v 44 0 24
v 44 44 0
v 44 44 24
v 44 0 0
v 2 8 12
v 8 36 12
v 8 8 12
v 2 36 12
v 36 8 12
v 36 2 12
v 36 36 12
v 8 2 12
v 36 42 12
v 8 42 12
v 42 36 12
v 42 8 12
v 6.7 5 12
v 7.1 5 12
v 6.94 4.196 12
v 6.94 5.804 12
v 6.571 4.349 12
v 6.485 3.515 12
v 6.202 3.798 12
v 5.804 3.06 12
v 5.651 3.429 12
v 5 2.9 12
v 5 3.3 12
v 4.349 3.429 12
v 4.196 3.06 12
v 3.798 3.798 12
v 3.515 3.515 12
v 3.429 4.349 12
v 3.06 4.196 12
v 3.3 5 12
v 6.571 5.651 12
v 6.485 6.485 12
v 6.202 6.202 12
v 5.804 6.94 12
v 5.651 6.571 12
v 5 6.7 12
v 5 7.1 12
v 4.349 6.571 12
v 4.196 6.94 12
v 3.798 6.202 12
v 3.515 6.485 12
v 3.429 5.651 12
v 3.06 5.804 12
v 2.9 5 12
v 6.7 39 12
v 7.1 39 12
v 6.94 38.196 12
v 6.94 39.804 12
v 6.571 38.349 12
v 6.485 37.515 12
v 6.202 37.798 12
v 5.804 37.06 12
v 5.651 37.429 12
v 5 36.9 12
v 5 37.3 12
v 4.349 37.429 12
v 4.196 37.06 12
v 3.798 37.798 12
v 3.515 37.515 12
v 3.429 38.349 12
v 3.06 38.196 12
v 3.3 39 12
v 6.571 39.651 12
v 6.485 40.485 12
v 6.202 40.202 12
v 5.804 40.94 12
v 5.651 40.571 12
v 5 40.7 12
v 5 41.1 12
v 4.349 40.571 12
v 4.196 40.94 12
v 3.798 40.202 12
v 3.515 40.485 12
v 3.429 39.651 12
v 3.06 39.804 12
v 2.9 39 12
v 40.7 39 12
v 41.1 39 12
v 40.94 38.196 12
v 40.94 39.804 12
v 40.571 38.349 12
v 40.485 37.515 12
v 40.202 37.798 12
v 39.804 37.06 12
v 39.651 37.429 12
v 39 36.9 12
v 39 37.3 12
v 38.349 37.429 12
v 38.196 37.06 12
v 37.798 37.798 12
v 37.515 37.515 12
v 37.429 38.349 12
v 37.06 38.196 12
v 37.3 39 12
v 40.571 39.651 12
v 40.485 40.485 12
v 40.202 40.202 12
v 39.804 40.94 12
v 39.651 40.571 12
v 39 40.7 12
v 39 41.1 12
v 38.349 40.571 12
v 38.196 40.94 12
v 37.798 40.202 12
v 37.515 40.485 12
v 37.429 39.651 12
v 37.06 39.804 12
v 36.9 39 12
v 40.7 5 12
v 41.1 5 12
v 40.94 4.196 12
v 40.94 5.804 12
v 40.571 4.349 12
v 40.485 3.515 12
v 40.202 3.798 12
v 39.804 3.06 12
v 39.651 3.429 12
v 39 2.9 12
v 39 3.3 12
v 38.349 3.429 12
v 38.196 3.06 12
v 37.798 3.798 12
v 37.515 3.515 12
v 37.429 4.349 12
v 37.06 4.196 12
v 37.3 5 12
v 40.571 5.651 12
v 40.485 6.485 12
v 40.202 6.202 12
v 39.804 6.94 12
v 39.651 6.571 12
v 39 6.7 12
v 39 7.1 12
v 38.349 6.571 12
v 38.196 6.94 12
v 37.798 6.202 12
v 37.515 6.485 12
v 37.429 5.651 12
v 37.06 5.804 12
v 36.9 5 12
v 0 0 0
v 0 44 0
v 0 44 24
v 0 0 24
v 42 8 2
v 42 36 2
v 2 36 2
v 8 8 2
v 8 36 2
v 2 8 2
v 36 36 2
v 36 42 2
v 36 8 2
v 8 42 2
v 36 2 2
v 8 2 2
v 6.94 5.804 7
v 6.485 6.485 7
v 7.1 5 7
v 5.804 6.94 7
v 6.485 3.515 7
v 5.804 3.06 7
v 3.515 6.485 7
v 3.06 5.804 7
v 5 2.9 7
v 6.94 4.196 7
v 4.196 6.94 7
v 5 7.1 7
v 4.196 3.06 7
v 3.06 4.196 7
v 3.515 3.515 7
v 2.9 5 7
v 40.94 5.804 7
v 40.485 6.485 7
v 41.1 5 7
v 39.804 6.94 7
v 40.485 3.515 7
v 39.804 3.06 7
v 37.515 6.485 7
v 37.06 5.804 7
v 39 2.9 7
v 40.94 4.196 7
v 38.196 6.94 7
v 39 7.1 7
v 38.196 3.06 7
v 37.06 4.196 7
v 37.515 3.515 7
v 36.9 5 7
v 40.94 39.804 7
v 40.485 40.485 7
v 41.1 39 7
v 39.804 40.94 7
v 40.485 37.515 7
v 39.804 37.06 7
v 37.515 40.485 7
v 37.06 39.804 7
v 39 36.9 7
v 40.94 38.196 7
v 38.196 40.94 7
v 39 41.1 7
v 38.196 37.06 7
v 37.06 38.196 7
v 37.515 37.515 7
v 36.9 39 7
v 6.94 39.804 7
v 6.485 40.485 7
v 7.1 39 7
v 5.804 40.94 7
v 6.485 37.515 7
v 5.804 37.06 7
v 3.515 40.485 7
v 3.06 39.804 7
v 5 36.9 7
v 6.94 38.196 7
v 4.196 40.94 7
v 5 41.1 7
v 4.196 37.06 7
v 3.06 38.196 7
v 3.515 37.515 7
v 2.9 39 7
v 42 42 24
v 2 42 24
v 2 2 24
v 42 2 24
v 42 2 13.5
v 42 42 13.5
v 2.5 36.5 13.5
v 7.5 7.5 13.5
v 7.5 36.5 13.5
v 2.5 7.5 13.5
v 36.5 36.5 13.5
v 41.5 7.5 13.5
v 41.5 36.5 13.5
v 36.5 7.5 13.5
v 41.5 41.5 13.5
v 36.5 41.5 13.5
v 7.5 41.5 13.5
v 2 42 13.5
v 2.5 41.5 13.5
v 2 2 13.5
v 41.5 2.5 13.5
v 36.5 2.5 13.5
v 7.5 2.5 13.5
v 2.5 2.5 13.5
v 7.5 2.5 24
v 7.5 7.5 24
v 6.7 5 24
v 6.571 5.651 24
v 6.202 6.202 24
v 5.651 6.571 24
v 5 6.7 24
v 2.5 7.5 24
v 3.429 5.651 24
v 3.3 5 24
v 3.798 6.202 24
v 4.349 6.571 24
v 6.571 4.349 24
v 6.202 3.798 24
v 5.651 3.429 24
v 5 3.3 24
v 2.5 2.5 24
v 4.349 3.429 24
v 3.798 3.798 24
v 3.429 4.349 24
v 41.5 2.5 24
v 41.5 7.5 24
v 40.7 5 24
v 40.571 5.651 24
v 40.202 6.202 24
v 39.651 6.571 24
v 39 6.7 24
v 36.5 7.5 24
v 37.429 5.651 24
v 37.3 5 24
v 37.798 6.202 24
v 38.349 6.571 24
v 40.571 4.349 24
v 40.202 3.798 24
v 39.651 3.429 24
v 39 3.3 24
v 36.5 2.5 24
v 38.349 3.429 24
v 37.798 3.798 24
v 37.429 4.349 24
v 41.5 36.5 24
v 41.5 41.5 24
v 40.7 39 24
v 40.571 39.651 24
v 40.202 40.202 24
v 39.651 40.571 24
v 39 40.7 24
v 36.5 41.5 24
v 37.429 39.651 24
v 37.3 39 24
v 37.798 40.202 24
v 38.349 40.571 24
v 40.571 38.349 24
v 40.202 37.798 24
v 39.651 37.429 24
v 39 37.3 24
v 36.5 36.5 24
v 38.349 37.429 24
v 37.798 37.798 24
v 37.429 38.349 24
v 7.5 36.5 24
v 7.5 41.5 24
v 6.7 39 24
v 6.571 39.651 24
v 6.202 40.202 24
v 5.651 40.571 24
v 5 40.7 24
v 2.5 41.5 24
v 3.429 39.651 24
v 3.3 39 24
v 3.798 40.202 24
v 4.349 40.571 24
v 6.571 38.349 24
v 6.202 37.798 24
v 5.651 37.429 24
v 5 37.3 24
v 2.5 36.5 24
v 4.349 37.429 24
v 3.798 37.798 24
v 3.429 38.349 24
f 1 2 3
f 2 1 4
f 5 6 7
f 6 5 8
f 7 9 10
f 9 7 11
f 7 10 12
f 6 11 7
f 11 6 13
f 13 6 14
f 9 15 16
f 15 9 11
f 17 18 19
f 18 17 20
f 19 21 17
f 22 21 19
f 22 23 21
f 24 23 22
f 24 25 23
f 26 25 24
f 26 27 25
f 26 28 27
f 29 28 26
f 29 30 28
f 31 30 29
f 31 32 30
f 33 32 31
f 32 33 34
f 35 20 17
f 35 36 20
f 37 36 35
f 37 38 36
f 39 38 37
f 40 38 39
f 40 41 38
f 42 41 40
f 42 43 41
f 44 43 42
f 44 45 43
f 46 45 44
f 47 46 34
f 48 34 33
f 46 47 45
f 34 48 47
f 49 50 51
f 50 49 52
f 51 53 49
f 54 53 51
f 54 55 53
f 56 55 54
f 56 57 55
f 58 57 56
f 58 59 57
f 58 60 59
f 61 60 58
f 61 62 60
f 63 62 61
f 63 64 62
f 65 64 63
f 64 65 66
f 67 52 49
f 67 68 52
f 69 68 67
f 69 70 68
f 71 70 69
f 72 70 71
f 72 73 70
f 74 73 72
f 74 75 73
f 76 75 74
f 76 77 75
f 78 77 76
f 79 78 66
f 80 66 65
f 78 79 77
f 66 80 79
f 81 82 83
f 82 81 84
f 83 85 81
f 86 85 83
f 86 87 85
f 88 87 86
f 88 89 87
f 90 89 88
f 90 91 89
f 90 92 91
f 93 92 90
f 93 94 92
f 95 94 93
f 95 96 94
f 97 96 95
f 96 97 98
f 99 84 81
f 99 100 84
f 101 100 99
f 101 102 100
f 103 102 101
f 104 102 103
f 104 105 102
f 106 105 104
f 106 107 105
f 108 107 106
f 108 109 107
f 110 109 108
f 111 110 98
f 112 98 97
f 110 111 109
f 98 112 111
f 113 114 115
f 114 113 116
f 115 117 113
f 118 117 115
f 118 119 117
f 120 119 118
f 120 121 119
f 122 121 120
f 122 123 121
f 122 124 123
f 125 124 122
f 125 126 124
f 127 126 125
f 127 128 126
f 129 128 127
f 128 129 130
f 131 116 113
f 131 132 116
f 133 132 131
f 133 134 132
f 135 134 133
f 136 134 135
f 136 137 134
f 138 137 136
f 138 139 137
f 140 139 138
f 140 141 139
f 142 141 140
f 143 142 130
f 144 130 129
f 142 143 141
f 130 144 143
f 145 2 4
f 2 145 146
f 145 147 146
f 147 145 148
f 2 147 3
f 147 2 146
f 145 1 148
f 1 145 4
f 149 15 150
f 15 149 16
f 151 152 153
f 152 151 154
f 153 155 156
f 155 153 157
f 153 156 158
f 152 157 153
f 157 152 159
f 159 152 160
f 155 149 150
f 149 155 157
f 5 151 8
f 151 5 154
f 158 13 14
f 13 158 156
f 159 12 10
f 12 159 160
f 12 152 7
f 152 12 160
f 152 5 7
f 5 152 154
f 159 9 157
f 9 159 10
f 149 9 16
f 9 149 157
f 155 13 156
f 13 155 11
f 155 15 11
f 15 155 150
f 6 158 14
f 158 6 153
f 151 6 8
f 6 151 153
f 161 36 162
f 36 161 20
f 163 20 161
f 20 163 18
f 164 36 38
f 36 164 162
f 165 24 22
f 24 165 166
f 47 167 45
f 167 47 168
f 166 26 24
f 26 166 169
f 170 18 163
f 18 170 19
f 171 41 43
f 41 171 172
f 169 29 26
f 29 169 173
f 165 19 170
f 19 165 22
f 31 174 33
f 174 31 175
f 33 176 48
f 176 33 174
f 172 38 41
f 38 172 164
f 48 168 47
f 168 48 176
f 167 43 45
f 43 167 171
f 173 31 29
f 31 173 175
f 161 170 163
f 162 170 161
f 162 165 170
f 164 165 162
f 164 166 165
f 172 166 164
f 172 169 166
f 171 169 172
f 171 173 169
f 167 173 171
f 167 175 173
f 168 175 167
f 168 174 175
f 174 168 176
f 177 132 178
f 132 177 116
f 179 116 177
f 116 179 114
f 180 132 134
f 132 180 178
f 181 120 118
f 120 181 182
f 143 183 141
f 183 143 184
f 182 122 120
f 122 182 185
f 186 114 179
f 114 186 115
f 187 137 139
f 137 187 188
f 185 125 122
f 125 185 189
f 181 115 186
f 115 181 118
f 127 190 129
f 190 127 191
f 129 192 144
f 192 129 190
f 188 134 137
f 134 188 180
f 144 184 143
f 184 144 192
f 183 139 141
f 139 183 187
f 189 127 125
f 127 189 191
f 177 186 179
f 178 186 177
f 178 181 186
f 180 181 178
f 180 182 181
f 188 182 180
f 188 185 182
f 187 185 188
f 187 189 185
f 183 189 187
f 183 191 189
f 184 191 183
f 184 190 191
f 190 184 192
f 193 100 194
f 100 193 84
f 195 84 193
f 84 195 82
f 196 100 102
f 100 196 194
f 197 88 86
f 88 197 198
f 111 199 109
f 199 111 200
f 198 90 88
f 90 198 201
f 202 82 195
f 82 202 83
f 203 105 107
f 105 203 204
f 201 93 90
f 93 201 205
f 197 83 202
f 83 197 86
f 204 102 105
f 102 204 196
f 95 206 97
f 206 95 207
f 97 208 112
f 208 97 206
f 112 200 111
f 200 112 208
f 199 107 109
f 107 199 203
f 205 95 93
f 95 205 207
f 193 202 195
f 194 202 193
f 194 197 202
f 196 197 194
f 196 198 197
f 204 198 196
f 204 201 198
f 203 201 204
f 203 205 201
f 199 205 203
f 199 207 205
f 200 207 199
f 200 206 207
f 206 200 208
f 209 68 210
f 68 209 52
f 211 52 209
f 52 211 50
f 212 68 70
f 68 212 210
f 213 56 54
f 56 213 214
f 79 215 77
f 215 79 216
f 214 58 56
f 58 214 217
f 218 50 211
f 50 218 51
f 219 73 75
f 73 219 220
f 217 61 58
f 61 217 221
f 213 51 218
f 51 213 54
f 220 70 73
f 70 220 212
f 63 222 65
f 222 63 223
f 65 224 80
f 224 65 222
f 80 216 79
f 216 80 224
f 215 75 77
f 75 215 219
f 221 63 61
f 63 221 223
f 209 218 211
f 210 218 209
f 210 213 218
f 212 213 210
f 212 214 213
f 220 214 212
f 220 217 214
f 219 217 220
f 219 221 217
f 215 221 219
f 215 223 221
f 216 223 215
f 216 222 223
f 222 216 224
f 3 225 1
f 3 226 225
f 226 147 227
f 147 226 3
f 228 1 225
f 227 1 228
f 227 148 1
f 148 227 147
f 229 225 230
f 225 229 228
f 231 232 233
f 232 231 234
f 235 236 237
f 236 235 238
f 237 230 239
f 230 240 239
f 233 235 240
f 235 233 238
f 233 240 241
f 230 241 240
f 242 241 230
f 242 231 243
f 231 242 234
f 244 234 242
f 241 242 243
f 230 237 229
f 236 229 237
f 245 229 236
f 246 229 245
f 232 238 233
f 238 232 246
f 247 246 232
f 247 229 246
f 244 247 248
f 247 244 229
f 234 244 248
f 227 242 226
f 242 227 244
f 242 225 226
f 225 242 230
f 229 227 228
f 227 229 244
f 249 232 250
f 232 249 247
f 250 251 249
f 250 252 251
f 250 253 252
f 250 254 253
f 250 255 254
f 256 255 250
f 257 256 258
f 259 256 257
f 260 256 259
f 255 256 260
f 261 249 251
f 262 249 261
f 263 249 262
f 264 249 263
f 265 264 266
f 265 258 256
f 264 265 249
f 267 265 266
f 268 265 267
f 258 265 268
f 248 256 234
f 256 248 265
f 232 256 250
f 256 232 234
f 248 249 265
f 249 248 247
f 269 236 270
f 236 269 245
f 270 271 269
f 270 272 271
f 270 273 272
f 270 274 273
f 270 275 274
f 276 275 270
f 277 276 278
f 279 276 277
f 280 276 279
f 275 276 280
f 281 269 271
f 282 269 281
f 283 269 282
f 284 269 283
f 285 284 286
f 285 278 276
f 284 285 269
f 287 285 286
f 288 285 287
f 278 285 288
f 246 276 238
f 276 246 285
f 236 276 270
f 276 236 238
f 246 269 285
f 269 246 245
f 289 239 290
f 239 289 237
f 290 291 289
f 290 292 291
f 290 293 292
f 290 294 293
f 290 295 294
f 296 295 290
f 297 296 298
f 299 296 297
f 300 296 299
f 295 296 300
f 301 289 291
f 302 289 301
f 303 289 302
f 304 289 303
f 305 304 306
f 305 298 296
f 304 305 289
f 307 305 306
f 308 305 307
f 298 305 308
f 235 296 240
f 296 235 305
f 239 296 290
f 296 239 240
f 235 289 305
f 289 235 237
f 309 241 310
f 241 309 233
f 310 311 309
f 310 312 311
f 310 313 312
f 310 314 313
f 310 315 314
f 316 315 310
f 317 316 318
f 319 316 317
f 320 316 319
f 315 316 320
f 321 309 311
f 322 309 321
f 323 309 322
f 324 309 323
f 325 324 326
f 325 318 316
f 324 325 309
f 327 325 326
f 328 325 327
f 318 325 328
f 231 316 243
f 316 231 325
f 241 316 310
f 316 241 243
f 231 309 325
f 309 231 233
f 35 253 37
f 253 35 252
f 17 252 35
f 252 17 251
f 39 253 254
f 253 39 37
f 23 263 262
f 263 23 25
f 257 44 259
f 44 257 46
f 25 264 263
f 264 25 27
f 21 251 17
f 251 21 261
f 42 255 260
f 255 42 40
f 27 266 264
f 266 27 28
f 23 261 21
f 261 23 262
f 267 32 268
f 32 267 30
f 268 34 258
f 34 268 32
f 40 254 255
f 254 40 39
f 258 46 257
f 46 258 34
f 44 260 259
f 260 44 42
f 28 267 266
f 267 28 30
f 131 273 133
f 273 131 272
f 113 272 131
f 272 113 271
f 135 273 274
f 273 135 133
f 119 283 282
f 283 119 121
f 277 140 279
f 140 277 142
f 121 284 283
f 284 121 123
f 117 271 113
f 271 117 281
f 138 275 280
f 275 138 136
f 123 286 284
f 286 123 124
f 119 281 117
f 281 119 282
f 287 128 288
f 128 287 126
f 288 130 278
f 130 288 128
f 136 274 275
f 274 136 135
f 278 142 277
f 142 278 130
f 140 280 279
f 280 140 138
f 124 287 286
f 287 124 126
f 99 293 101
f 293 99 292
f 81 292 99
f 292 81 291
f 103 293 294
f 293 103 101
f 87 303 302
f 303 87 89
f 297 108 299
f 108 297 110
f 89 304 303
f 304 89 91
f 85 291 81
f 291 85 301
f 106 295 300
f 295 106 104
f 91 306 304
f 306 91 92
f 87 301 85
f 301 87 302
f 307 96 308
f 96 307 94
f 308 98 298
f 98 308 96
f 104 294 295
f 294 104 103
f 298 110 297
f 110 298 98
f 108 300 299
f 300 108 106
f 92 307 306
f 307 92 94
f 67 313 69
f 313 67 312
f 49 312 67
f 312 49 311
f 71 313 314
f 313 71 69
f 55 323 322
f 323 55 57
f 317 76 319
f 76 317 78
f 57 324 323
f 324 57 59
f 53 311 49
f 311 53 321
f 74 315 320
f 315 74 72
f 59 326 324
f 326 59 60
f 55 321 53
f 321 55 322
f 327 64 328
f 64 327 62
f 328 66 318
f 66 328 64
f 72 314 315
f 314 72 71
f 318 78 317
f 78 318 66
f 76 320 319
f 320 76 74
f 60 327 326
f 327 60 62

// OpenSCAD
// M3 specifications
M3_CLEAR = 3.4;      // Clearance hole diameter
M3_INSERT = 4.2;     // Insert bore diameter
INSERT_DEPTH = 5;    // Insert depth

// Enclosure dimensions
CAVITY_X = 40;
CAVITY_Y = 40;
CAVITY_Z = 20;
WALL = 2.0;          // Nominal wall thickness
WALL_MIN = 1.5;      // Minimum wall thickness

// External dimensions
EXT_X = CAVITY_X + 2*WALL;
EXT_Y = CAVITY_Y + 2*WALL;
BASE_H = 12;
LID_H = 12;

// Fastener positions (inset from corners for wall strength)
INSET = 5;
SCREW_POS = [
    [INSET, INSET],
    [EXT_X - INSET, INSET],
    [EXT_X - INSET, EXT_Y - INSET],
    [INSET, EXT_Y - INSET]
];

module base() {
    difference() {
        union() {
            // Hollow outer shell
            difference() {
                cube([EXT_X, EXT_Y, BASE_H]);
                translate([WALL, WALL, WALL])
                    cube([CAVITY_X, CAVITY_Y, BASE_H - WALL + 0.01]);
            }
            // Solid posts for screw holes
            for (p = SCREW_POS) {
                translate([p[0] - 3, p[1] - 3, 0])
                    cube([6, 6, BASE_H]);
            }
        }
        // Drill heat-set insert holes
        for (p = SCREW_POS) {
            translate([p[0], p[1], BASE_H - INSERT_DEPTH])
                cylinder(h=INSERT_DEPTH + 1, r=M3_INSERT/2, $fn=16);
        }
    }
}

module lid() {
    difference() {
        union() {
            // Hollow outer shell
            difference() {
                cube([EXT_X, EXT_Y, LID_H]);
                translate([WALL, WALL, WALL_MIN])
                    cube([CAVITY_X, CAVITY_Y, LID_H - WALL_MIN + 0.01]);
            }
            // Solid posts under clearance holes
            for (p = SCREW_POS) {
                translate([p[0] - 2.5, p[1] - 2.5, 0])
                    cube([5, 5, LID_H]);
            }
        }
        // Drill clearance holes through lid
        for (p = SCREW_POS) {
            translate([p[0], p[1], -0.5])
                cylinder(h=LID_H + 1, r=M3_CLEAR/2, $fn=16);
        }
    }
}

// Assembly: base at origin, lid positioned above
base();
translate([0, 0, BASE_H])
    lid();
